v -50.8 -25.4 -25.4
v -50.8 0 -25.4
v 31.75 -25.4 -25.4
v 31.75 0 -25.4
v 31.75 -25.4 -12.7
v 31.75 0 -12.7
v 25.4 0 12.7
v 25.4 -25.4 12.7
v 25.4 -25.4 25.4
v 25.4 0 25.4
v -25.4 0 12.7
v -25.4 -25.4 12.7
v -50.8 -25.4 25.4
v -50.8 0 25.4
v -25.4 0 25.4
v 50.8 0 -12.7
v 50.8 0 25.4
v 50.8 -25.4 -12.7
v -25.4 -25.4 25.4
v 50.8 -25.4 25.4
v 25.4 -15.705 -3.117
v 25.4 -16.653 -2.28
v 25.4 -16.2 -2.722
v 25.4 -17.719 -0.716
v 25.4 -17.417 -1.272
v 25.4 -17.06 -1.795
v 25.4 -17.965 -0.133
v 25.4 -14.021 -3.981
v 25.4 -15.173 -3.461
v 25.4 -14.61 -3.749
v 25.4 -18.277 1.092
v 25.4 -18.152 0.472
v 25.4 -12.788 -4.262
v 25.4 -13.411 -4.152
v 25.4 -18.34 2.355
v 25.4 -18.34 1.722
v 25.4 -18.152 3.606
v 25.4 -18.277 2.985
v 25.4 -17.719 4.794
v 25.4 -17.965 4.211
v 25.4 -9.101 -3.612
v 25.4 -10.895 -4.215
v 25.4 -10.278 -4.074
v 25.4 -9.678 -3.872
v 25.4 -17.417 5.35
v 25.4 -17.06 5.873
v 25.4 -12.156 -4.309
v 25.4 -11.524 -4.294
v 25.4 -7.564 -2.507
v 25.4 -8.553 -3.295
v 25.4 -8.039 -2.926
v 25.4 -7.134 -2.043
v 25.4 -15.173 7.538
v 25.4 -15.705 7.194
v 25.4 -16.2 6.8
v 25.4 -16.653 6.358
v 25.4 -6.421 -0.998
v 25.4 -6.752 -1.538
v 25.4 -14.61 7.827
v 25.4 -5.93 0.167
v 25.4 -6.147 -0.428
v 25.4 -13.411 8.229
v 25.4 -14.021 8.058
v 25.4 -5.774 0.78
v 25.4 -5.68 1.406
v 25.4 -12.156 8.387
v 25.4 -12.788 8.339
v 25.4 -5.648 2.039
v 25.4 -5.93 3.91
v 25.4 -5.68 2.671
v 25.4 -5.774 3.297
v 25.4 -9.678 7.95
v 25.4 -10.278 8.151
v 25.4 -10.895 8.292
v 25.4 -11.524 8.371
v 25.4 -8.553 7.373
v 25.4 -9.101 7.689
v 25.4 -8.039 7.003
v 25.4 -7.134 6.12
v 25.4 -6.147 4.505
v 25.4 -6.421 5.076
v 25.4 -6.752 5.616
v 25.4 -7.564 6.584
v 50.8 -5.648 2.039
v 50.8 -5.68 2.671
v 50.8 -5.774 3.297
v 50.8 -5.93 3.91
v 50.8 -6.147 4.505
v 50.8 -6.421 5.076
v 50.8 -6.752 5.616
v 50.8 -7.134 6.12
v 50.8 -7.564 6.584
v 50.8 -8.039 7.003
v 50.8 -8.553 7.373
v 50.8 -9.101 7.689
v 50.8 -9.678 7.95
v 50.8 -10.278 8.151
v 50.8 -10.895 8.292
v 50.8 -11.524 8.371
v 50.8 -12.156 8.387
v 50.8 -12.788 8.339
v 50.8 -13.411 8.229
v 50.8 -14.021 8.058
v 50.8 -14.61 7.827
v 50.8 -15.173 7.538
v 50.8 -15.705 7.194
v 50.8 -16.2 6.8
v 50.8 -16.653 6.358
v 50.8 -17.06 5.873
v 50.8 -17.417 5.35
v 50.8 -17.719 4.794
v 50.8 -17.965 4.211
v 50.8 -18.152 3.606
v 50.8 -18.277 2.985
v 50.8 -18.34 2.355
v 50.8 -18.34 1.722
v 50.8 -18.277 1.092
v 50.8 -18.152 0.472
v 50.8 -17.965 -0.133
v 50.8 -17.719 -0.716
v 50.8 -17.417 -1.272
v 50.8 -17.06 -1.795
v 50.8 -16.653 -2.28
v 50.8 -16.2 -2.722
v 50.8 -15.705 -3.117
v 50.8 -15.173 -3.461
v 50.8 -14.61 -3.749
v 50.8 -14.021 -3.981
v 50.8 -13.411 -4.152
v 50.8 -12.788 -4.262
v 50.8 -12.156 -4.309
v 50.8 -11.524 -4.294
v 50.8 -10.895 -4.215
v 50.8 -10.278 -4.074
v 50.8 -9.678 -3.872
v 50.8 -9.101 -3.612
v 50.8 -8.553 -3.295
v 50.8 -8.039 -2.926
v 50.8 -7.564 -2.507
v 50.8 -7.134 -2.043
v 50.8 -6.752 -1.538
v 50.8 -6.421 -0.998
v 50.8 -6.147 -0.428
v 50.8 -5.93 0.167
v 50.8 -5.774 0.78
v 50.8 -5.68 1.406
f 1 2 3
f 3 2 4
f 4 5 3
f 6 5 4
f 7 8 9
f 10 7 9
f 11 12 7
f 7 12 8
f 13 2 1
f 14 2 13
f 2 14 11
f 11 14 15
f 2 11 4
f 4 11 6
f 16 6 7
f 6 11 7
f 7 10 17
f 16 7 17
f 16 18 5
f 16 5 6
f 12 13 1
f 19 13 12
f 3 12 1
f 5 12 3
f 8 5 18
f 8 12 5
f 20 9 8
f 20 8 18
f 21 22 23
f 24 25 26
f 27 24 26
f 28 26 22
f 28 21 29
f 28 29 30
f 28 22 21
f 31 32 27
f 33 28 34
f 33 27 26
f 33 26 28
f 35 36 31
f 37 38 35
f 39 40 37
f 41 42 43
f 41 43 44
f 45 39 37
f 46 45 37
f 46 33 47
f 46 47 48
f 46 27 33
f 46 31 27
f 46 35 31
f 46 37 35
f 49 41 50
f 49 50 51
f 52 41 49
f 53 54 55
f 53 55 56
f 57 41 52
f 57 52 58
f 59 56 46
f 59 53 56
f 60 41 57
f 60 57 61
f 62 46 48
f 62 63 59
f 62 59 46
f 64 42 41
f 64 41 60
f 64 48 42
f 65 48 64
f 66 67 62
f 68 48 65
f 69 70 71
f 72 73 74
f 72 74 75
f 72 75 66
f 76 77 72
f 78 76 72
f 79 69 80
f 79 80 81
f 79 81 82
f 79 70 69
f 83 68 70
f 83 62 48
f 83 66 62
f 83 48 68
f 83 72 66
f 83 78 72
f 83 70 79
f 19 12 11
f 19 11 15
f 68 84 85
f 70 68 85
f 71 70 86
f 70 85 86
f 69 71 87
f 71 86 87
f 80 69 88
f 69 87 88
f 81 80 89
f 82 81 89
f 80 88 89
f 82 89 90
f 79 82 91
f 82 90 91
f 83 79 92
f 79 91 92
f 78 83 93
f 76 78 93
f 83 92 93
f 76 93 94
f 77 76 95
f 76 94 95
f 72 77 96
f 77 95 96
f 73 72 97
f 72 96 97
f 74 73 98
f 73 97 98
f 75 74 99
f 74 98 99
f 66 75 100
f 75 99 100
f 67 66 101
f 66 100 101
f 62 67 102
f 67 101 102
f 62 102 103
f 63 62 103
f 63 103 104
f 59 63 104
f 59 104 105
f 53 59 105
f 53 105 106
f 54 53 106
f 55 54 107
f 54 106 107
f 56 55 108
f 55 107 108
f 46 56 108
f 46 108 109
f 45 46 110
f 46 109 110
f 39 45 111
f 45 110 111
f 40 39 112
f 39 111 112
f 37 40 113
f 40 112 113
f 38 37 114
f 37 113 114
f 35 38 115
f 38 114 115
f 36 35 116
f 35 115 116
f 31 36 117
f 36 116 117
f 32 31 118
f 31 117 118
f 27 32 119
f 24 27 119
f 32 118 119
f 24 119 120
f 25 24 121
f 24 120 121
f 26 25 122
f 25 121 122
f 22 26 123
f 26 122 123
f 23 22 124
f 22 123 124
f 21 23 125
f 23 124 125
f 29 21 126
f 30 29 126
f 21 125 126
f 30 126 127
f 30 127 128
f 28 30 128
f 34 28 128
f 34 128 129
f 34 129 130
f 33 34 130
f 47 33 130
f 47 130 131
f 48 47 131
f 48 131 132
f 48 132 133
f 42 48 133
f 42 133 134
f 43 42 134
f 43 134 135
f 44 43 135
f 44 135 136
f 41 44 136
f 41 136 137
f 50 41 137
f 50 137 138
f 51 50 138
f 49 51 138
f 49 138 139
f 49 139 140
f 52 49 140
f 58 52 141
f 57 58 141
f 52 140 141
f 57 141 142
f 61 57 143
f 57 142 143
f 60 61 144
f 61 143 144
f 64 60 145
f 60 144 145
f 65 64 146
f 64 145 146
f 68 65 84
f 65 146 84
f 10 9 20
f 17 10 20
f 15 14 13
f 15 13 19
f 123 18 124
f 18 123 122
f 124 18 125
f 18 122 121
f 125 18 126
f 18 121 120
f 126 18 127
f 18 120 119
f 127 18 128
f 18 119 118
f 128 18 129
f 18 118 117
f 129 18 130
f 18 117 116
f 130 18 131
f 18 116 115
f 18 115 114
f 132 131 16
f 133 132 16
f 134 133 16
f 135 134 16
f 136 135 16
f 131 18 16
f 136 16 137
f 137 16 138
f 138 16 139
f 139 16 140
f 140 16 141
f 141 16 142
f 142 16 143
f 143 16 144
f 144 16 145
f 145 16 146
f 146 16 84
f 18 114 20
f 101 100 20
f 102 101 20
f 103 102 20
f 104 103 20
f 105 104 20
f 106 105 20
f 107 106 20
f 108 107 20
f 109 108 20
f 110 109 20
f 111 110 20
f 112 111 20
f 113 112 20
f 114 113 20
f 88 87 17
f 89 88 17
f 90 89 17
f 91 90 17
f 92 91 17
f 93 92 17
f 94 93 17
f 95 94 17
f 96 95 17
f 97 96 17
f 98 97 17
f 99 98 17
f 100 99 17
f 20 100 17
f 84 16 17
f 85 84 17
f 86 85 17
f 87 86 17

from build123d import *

# Parameters (mm, degrees)
F0_W     = 101.6
F0_H     = 50.8
F1_DEPTH = 25.4
F2_W     = 50.8
F2_H     = 12.7
F3_DEPTH = 25.401
F4_W     = 25.4
F4_H     = 12.7
F5_DEPTH = 19.05
F6_R     = 6.35
F7_DEPTH = 25.4


with BuildPart() as f1:
    # F0 (on Front) → F1 (new body)
    with BuildSketch(Plane.XZ):
        Rectangle(F0_W, F0_H)
    extrude(amount=F1_DEPTH)

    # F2 (on face) → F3 (cut, through all)
    with BuildSketch(Plane.XZ.offset(25.4)):
        with Locations((0, 19.05)):
            Rectangle(F2_W, F2_H)
    extrude(amount=-F3_DEPTH, mode=Mode.SUBTRACT)

    # F4 (on face) → F5 (cut)
    with BuildSketch(Plane.YZ.offset(50.8)):
        with Locations((-12.7, -19.05)):
            Rectangle(F4_W, F4_H)
    extrude(amount=-F5_DEPTH, mode=Mode.SUBTRACT)

    # F6 (on face) → F7 (cut)
    with BuildSketch(Plane.YZ.offset(50.8)):
        with Locations((-11.998156, 2.038684)):
            Circle(F6_R)
    extrude(amount=-F7_DEPTH, mode=Mode.SUBTRACT)


solid = f1.part
